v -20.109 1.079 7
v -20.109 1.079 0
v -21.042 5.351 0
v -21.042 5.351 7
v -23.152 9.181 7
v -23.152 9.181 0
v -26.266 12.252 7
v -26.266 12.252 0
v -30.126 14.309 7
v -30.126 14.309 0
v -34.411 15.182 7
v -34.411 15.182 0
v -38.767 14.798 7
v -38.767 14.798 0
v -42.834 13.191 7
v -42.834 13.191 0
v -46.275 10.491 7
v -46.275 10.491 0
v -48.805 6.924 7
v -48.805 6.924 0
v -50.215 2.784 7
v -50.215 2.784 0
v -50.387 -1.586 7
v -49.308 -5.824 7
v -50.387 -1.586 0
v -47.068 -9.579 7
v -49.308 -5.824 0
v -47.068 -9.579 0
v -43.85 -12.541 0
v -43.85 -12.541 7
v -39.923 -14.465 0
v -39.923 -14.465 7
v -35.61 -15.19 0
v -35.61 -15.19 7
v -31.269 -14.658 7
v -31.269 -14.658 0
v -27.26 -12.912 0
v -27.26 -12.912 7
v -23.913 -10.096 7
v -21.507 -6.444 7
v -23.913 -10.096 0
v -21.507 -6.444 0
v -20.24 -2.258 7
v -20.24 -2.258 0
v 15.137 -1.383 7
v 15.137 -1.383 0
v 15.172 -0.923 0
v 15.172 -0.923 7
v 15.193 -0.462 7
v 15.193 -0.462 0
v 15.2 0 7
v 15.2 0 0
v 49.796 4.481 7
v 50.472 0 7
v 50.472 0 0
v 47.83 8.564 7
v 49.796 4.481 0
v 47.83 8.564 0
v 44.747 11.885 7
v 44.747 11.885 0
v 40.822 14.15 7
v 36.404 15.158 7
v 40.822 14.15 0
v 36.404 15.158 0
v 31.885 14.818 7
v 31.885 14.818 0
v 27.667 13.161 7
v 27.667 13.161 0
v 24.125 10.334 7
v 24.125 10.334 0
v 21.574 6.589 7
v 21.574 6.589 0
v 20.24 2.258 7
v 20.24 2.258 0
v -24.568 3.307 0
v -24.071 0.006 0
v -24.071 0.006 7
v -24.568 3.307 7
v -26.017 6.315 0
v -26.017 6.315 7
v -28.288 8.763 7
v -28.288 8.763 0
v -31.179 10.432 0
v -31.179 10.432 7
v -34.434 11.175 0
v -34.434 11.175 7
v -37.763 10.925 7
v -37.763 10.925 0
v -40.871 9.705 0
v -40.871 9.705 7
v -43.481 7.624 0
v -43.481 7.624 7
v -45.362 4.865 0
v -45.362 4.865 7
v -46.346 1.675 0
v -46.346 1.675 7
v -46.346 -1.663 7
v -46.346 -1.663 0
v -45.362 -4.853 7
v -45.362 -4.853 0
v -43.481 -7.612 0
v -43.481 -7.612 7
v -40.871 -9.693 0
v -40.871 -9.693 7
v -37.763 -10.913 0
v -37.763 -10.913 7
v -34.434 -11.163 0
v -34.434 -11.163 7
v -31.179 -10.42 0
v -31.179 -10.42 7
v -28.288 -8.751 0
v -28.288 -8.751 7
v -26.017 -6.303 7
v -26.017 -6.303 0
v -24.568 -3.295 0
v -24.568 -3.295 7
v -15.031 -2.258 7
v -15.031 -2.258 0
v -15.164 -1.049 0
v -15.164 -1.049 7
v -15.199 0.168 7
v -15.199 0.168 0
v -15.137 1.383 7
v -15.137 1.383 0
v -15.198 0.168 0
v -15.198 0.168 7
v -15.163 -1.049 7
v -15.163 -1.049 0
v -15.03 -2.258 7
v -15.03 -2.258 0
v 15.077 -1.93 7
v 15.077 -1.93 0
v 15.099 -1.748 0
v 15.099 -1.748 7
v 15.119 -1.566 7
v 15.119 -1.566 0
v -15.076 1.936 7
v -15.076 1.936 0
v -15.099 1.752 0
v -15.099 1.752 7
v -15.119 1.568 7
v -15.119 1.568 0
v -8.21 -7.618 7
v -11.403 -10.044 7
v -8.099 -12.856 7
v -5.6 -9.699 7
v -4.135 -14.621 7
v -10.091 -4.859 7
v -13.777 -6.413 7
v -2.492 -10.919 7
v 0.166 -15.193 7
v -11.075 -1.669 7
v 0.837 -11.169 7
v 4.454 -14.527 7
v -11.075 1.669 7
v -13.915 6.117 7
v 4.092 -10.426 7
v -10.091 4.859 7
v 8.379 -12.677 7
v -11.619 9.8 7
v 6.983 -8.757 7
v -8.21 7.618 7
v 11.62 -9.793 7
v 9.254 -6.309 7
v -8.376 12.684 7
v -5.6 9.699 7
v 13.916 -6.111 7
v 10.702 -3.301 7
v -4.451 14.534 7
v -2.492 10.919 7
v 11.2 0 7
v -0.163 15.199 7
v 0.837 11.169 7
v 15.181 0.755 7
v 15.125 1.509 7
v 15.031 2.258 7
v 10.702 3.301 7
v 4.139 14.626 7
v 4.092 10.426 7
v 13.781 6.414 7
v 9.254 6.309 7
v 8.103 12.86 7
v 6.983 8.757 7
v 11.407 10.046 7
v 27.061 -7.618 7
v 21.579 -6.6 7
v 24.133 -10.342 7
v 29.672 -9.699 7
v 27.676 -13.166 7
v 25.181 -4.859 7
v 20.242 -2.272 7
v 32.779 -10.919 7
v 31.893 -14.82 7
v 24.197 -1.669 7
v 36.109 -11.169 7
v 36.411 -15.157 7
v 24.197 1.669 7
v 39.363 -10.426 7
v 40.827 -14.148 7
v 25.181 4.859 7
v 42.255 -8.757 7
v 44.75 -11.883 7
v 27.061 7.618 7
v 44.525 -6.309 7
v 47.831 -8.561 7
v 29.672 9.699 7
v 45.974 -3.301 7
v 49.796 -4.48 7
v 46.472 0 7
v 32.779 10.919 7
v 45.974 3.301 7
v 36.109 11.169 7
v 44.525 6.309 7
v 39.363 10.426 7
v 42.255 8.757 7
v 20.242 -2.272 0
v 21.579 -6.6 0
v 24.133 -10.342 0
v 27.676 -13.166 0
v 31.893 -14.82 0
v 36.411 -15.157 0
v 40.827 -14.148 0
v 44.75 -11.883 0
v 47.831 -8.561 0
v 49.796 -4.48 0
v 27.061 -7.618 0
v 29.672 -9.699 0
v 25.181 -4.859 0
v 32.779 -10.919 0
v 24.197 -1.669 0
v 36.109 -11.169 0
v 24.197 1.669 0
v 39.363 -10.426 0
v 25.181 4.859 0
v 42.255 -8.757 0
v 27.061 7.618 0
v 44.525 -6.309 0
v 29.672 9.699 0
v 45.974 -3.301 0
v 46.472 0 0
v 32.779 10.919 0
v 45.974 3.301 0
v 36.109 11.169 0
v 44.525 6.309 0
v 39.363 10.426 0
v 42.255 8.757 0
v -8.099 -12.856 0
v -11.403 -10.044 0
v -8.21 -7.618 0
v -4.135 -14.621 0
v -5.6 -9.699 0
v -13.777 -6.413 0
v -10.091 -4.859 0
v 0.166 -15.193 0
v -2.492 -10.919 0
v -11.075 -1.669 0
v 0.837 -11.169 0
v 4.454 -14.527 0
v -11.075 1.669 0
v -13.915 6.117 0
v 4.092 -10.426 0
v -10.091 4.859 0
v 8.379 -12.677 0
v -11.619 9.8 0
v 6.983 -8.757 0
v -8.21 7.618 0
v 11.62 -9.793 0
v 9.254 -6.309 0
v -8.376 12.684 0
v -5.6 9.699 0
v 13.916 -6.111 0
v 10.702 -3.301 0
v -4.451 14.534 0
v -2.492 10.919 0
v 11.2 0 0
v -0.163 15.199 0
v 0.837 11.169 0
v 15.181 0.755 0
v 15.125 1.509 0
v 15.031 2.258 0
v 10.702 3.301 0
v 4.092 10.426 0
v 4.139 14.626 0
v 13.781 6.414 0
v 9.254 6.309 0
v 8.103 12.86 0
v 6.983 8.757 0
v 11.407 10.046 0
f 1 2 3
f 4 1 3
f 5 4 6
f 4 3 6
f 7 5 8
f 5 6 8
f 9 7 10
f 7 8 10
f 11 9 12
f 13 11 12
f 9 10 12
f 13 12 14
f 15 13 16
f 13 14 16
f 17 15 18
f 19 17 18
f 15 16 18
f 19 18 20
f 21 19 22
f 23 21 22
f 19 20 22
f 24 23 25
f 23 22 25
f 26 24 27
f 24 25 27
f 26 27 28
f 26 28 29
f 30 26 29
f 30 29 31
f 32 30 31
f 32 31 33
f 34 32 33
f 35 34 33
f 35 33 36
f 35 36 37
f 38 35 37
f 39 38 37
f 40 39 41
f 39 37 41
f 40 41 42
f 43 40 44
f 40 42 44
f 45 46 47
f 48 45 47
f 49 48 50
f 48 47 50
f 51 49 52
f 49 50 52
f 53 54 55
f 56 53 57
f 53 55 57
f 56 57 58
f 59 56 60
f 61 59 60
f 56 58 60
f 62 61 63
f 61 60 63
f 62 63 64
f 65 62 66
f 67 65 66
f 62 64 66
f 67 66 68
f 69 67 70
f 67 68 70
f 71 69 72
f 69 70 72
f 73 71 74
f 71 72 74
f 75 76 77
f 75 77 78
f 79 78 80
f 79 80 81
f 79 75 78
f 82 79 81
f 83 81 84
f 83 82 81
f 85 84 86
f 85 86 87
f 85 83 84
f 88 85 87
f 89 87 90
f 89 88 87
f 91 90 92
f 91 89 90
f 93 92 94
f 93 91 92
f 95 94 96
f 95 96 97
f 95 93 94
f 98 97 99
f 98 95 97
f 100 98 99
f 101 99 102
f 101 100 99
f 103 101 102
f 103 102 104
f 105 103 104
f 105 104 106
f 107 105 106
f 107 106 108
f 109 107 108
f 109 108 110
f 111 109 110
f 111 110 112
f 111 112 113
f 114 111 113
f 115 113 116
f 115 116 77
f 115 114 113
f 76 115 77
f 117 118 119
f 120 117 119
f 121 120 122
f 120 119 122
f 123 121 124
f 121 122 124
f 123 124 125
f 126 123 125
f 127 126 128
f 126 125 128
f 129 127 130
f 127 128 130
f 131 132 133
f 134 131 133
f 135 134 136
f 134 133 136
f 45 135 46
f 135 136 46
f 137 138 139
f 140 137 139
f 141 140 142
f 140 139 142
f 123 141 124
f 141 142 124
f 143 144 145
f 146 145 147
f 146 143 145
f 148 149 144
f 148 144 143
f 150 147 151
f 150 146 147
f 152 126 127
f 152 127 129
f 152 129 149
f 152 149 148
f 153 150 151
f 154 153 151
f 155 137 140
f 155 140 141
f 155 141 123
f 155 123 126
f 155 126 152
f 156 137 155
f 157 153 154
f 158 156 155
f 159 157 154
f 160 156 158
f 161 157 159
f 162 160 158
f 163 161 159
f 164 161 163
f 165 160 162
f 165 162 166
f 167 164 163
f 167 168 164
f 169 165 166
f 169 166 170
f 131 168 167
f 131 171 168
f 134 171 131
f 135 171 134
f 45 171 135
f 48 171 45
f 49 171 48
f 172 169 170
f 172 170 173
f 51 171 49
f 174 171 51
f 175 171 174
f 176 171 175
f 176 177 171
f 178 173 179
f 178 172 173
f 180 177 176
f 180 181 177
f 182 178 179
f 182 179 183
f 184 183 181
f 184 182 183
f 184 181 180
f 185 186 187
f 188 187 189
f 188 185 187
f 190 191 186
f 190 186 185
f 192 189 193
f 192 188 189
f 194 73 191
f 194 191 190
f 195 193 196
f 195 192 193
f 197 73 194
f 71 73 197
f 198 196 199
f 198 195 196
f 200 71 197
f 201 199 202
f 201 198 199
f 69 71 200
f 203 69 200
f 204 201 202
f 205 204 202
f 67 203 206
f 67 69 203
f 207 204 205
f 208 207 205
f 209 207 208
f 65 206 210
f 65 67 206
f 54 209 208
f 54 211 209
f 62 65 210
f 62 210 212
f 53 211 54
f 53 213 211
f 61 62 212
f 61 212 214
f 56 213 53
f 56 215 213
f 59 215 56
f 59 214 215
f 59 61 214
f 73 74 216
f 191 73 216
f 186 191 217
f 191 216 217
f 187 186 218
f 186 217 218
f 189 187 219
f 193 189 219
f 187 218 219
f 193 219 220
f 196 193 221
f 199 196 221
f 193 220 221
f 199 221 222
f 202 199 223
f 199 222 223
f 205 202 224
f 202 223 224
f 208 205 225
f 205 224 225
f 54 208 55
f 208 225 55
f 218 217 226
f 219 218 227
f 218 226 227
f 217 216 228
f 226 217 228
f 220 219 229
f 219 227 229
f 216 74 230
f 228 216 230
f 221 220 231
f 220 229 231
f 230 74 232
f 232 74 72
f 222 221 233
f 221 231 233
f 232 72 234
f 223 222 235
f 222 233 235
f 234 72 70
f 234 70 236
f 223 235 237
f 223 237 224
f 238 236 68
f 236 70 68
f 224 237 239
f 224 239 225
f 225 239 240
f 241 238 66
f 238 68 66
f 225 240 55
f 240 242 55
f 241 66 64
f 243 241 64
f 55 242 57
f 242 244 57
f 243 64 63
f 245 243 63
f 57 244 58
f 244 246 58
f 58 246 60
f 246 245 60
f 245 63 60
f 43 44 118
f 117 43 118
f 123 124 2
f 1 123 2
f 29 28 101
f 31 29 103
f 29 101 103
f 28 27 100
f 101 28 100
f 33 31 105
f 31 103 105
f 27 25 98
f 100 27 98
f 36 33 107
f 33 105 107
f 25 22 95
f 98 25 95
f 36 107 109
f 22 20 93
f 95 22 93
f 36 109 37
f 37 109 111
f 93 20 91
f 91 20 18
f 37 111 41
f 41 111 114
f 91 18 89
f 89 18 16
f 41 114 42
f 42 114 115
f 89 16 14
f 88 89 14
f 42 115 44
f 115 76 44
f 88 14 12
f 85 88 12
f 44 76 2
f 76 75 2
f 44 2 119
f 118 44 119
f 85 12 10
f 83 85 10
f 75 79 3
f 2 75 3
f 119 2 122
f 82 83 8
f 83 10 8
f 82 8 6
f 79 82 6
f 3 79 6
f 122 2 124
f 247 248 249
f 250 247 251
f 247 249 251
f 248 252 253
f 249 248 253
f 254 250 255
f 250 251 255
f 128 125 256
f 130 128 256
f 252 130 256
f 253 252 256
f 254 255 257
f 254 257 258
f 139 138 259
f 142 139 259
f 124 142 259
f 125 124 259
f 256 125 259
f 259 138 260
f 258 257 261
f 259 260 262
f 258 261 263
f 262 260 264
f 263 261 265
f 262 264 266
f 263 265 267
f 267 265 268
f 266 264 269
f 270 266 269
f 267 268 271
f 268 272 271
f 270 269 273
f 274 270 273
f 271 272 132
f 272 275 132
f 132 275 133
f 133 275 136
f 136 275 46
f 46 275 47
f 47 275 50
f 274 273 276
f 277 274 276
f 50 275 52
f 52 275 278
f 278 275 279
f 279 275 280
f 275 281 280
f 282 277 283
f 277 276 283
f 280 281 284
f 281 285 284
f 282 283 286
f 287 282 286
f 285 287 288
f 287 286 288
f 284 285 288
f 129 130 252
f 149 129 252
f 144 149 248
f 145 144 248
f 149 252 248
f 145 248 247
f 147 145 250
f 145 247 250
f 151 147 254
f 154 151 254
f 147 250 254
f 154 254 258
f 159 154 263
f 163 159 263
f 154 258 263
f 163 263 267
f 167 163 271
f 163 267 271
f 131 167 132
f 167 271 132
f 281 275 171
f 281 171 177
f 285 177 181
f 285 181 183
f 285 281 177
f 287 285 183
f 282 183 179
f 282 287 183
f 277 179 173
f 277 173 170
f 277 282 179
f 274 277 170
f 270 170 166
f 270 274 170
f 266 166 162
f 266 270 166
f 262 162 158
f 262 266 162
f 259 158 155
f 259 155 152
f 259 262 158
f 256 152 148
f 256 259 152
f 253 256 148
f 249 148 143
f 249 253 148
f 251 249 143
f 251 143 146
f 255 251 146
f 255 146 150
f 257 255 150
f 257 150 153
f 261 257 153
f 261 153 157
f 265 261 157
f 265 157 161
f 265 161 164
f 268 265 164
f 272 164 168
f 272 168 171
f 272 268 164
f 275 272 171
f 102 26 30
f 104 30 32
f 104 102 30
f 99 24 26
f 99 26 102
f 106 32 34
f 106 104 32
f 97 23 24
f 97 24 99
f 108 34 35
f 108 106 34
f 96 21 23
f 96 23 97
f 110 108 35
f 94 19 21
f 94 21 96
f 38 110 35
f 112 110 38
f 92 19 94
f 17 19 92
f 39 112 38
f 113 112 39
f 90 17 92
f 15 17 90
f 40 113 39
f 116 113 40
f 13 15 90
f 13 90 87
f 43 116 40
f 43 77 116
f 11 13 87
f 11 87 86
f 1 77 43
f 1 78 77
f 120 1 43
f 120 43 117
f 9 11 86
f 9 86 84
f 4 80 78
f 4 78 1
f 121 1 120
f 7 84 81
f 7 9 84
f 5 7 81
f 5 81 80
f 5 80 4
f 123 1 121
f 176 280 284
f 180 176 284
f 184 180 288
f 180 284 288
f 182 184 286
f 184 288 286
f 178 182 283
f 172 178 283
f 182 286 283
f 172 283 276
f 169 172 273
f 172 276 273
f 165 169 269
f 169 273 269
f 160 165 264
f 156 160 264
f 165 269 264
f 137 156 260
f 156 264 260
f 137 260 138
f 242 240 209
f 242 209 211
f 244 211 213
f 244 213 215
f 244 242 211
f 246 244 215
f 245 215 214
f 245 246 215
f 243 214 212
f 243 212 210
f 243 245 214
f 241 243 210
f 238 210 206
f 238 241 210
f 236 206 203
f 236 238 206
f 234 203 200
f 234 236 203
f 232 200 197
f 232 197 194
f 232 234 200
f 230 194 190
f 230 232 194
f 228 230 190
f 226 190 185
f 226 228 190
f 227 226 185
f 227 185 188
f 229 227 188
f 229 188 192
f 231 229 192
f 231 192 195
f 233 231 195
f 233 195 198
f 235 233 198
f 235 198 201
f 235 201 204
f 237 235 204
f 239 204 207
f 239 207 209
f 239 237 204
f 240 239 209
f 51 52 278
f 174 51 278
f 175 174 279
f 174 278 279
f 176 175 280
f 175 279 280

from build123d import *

# Parameters (mm, degrees)
F0_R     = 11.2
F1_DEPTH = 7


with BuildPart() as f1:
    # F0 (on Top) → F1 (new body)
    with BuildSketch(Plane.XY):
        with BuildLine():
            ThreePointArc((-20.0708194183, 0.0059993199), (-20.0802947379, 0.5426183037), (-20.1087088833, 1.0785682564))
            ThreePointArc((-20.1087088833, 1.0785682564), (-50.4589911673, 0.605531574), (-20.2404302275, -2.2583771442))
            ThreePointArc((-20.2404302275, -2.2583771442), (-20.1132814306, -1.1293606008), (-20.0708194183, 0.0059993199))
        make_face()
        with Locations((-35.2708194183, 0.0059993199)):
            Circle(F0_R, mode=Mode.SUBTRACT)
        with BuildLine():
            ThreePointArc((-15.0312917833, -2.2583771442), (-15.1936035889, -0.4409194749), (-15.1369616844, 1.3828922469))
            Line((-15.1369616844, 1.3828922469), (-20.1087088833, 1.0785682564))
            ThreePointArc((-20.1087088833, 1.0785682564), (-20.0802947379, 0.5426183037), (-20.0708194183, 0.0059993199))
            ThreePointArc((-20.0708194183, 0.0059993199), (-20.1132814306, -1.1293606008), (-20.2404302275, -2.2583771442))
            Line((-20.2404302275, -2.2583771442), (-15.0312917833, -2.2583771442))
        make_face()
    extrude(amount=F1_DEPTH)


with BuildPart() as f1b:
    # F0 (on Top) → F1, piece 2 (new body)
    with BuildSketch(Plane.XY):
        with BuildLine():
            ThreePointArc((15.1369632135, -1.3828755088), (15.1842326254, -0.6921557464), (15.2, 0))
            ThreePointArc((15.2, 0), (15.1577642663, 1.1323349535), (15.0312917833, 2.2583771442))
            ThreePointArc((15.0312917833, 2.2583771442), (-0.1626088496, 15.1991301844), (-15.0761684857, 1.9362705882))
            ThreePointArc((-15.0761684857, 1.9362705882), (-15.1089867075, 1.6598655655), (-15.1367380355, 1.3829059366))
            ThreePointArc((-15.1367380355, 1.3829059366), (-15.1926579272, -0.440956222), (-15.0296198963, -2.2583771442))
            ThreePointArc((-15.0296198963, -2.2583771442), (0.1664113859, -15.1930981105), (15.0769377803, -1.9302712683))
            ThreePointArc((15.0769377803, -1.9302712683), (15.1094296333, -1.6568452417), (15.1369632135, -1.3828755088))
        make_face()
        Circle(F0_R, mode=Mode.SUBTRACT)
    extrude(amount=F1_DEPTH)


with BuildPart() as f1c:
    # F0 (on Top) → F1, piece 3 (new body)
    with BuildSketch(Plane.XY):
        with BuildLine():
            ThreePointArc((50.4715887129, 0), (36.4039236664, 15.1577642663), (20.2402969296, 2.2583771442))
            ThreePointArc((20.2402969296, 2.2583771442), (34.1392537594, -15.1577642663), (50.4715887129, 0))
        make_face()
        with Locations((35.2715887129, 0)):
            Circle(F0_R, mode=Mode.SUBTRACT)
    extrude(amount=F1_DEPTH)


solid = Compound([f1.part, f1b.part, f1c.part])
